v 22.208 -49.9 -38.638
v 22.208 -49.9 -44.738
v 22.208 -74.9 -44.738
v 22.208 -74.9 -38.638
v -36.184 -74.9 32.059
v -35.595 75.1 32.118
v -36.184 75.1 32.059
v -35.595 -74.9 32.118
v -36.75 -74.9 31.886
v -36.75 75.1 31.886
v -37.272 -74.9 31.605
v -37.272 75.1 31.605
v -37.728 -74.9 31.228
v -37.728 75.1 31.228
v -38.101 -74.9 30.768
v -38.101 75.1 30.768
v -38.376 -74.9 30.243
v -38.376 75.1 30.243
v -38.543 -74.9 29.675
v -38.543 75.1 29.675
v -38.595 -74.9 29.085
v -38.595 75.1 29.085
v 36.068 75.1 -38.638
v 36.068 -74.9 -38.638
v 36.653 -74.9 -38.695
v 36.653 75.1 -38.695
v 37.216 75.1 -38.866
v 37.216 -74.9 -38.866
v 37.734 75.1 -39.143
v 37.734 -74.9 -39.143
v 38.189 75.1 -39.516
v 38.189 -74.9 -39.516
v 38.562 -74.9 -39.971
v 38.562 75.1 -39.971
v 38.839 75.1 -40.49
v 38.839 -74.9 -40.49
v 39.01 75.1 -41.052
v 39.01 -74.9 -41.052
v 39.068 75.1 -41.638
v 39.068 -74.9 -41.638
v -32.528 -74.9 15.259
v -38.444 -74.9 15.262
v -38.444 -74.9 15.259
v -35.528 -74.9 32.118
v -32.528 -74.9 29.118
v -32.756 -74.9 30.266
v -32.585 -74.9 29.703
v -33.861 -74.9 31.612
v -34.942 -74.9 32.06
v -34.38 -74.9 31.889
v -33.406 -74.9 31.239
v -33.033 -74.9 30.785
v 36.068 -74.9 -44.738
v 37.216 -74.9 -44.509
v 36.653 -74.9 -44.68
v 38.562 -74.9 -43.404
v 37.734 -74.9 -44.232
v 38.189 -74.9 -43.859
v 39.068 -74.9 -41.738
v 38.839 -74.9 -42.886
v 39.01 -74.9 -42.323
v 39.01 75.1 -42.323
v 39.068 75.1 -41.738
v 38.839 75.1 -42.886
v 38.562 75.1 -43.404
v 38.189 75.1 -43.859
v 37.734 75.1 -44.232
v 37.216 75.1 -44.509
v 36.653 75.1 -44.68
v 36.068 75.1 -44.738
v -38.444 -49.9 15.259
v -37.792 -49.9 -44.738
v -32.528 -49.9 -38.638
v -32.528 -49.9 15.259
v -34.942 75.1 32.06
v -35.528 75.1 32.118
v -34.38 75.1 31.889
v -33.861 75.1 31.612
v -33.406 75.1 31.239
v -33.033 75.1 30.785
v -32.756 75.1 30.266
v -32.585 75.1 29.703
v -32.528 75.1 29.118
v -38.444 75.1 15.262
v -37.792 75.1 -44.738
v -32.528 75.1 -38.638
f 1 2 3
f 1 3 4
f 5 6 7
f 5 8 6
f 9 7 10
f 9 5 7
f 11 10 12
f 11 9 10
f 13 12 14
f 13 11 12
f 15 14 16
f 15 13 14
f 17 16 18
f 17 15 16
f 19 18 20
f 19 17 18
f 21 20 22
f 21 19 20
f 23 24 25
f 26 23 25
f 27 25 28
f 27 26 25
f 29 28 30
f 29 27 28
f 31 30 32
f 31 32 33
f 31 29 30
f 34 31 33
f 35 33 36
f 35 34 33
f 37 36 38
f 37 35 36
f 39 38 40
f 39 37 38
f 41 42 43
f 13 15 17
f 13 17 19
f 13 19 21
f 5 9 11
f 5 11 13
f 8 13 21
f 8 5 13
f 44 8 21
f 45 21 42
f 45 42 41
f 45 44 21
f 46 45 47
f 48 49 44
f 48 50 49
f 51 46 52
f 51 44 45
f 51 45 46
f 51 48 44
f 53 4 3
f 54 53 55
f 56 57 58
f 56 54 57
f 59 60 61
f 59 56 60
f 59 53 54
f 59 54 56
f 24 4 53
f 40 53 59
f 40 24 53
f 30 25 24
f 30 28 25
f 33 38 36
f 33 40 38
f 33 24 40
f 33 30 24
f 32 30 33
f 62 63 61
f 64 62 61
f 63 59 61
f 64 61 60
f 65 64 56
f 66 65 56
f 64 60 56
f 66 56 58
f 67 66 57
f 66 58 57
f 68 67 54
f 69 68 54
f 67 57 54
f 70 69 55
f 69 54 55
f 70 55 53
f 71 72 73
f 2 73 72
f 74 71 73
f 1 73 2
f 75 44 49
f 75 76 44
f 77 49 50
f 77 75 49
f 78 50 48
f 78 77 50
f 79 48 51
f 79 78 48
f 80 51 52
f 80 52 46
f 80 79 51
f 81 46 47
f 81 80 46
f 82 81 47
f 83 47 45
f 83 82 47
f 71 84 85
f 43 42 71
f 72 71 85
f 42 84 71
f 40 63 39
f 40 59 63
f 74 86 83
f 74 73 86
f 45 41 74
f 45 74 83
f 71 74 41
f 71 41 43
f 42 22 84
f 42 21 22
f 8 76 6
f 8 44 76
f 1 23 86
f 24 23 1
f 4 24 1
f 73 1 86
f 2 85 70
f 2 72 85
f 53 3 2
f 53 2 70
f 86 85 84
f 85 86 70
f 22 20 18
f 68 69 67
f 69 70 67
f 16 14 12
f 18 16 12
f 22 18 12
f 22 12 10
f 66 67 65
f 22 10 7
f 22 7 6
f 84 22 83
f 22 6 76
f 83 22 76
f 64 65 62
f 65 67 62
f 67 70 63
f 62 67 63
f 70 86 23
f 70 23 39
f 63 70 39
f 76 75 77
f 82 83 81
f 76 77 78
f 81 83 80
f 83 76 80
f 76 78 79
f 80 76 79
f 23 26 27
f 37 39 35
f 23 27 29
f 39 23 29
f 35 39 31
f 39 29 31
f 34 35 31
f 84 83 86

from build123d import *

# Parameters (mm, degrees)
F0_W     = 16.86
F0_H     = 6.1000012737
F1_DEPTH = 74.9
F2_DEPTH = 75.1
F3_R     = 3
F5_DEPTH = 25


with BuildPart() as f1:
    # F0 (on Front) → F1 (new body)
    with BuildSketch(Plane.XZ):
        Polygon((-32.5276732162, 32.1178423136), (-38.6276732162, 32.1178423136), (-38.444462499, 15.2623822779), (-32.5276732162, 15.3266949223), align=None)
        Polygon((-32.5276732162, 15.3266949223), (-38.444462499, 15.2623822779), (-37.7922914511, -44.7376177221), (22.2077085489, -44.7376177221), (22.2077085489, -38.6376164485), (-32.5276732162, -38.6376164485), align=None)
        with Locations((30.6377085489, -41.6876170853)):
            Rectangle(F0_W, F0_H)
    extrude(amount=F1_DEPTH)

    # F2 (add): a face of the model
    f2_faces = [f1.faces().sort_by_distance(p)[0] for p in [
        (-35.5776732162, 0, 31.0249866925),
    ]]
    extrude(f2_faces, amount=F2_DEPTH)

    # F3
    f3_edges = [f1.edges().sort_by_distance(p)[0] for p in [
        (-32.527673, 0.1, 32.117842),
        (-38.627673, 0.1, 32.117842),
        (39.067709, 0.1, -44.737618),
        (39.067709, 0.1, -38.637616),
    ]]
    fillet(f3_edges, radius=F3_R)

    # F4 (on face) → F5 (cut)
    with BuildSketch(Plane.XZ.offset(74.9)):
        Polygon((-32.5276732162, 15.2588381996), (-38.4444239765, 15.2588381996), (-37.7922914511, -44.7376177221), (22.2077085489, -44.7376177221), (22.2077085489, -38.6376164485), (-32.5276732162, -38.6376164485), (-32.5276732162, -35.7810780406), align=None)
    extrude(amount=-F5_DEPTH, mode=Mode.SUBTRACT)


solid = f1.part
